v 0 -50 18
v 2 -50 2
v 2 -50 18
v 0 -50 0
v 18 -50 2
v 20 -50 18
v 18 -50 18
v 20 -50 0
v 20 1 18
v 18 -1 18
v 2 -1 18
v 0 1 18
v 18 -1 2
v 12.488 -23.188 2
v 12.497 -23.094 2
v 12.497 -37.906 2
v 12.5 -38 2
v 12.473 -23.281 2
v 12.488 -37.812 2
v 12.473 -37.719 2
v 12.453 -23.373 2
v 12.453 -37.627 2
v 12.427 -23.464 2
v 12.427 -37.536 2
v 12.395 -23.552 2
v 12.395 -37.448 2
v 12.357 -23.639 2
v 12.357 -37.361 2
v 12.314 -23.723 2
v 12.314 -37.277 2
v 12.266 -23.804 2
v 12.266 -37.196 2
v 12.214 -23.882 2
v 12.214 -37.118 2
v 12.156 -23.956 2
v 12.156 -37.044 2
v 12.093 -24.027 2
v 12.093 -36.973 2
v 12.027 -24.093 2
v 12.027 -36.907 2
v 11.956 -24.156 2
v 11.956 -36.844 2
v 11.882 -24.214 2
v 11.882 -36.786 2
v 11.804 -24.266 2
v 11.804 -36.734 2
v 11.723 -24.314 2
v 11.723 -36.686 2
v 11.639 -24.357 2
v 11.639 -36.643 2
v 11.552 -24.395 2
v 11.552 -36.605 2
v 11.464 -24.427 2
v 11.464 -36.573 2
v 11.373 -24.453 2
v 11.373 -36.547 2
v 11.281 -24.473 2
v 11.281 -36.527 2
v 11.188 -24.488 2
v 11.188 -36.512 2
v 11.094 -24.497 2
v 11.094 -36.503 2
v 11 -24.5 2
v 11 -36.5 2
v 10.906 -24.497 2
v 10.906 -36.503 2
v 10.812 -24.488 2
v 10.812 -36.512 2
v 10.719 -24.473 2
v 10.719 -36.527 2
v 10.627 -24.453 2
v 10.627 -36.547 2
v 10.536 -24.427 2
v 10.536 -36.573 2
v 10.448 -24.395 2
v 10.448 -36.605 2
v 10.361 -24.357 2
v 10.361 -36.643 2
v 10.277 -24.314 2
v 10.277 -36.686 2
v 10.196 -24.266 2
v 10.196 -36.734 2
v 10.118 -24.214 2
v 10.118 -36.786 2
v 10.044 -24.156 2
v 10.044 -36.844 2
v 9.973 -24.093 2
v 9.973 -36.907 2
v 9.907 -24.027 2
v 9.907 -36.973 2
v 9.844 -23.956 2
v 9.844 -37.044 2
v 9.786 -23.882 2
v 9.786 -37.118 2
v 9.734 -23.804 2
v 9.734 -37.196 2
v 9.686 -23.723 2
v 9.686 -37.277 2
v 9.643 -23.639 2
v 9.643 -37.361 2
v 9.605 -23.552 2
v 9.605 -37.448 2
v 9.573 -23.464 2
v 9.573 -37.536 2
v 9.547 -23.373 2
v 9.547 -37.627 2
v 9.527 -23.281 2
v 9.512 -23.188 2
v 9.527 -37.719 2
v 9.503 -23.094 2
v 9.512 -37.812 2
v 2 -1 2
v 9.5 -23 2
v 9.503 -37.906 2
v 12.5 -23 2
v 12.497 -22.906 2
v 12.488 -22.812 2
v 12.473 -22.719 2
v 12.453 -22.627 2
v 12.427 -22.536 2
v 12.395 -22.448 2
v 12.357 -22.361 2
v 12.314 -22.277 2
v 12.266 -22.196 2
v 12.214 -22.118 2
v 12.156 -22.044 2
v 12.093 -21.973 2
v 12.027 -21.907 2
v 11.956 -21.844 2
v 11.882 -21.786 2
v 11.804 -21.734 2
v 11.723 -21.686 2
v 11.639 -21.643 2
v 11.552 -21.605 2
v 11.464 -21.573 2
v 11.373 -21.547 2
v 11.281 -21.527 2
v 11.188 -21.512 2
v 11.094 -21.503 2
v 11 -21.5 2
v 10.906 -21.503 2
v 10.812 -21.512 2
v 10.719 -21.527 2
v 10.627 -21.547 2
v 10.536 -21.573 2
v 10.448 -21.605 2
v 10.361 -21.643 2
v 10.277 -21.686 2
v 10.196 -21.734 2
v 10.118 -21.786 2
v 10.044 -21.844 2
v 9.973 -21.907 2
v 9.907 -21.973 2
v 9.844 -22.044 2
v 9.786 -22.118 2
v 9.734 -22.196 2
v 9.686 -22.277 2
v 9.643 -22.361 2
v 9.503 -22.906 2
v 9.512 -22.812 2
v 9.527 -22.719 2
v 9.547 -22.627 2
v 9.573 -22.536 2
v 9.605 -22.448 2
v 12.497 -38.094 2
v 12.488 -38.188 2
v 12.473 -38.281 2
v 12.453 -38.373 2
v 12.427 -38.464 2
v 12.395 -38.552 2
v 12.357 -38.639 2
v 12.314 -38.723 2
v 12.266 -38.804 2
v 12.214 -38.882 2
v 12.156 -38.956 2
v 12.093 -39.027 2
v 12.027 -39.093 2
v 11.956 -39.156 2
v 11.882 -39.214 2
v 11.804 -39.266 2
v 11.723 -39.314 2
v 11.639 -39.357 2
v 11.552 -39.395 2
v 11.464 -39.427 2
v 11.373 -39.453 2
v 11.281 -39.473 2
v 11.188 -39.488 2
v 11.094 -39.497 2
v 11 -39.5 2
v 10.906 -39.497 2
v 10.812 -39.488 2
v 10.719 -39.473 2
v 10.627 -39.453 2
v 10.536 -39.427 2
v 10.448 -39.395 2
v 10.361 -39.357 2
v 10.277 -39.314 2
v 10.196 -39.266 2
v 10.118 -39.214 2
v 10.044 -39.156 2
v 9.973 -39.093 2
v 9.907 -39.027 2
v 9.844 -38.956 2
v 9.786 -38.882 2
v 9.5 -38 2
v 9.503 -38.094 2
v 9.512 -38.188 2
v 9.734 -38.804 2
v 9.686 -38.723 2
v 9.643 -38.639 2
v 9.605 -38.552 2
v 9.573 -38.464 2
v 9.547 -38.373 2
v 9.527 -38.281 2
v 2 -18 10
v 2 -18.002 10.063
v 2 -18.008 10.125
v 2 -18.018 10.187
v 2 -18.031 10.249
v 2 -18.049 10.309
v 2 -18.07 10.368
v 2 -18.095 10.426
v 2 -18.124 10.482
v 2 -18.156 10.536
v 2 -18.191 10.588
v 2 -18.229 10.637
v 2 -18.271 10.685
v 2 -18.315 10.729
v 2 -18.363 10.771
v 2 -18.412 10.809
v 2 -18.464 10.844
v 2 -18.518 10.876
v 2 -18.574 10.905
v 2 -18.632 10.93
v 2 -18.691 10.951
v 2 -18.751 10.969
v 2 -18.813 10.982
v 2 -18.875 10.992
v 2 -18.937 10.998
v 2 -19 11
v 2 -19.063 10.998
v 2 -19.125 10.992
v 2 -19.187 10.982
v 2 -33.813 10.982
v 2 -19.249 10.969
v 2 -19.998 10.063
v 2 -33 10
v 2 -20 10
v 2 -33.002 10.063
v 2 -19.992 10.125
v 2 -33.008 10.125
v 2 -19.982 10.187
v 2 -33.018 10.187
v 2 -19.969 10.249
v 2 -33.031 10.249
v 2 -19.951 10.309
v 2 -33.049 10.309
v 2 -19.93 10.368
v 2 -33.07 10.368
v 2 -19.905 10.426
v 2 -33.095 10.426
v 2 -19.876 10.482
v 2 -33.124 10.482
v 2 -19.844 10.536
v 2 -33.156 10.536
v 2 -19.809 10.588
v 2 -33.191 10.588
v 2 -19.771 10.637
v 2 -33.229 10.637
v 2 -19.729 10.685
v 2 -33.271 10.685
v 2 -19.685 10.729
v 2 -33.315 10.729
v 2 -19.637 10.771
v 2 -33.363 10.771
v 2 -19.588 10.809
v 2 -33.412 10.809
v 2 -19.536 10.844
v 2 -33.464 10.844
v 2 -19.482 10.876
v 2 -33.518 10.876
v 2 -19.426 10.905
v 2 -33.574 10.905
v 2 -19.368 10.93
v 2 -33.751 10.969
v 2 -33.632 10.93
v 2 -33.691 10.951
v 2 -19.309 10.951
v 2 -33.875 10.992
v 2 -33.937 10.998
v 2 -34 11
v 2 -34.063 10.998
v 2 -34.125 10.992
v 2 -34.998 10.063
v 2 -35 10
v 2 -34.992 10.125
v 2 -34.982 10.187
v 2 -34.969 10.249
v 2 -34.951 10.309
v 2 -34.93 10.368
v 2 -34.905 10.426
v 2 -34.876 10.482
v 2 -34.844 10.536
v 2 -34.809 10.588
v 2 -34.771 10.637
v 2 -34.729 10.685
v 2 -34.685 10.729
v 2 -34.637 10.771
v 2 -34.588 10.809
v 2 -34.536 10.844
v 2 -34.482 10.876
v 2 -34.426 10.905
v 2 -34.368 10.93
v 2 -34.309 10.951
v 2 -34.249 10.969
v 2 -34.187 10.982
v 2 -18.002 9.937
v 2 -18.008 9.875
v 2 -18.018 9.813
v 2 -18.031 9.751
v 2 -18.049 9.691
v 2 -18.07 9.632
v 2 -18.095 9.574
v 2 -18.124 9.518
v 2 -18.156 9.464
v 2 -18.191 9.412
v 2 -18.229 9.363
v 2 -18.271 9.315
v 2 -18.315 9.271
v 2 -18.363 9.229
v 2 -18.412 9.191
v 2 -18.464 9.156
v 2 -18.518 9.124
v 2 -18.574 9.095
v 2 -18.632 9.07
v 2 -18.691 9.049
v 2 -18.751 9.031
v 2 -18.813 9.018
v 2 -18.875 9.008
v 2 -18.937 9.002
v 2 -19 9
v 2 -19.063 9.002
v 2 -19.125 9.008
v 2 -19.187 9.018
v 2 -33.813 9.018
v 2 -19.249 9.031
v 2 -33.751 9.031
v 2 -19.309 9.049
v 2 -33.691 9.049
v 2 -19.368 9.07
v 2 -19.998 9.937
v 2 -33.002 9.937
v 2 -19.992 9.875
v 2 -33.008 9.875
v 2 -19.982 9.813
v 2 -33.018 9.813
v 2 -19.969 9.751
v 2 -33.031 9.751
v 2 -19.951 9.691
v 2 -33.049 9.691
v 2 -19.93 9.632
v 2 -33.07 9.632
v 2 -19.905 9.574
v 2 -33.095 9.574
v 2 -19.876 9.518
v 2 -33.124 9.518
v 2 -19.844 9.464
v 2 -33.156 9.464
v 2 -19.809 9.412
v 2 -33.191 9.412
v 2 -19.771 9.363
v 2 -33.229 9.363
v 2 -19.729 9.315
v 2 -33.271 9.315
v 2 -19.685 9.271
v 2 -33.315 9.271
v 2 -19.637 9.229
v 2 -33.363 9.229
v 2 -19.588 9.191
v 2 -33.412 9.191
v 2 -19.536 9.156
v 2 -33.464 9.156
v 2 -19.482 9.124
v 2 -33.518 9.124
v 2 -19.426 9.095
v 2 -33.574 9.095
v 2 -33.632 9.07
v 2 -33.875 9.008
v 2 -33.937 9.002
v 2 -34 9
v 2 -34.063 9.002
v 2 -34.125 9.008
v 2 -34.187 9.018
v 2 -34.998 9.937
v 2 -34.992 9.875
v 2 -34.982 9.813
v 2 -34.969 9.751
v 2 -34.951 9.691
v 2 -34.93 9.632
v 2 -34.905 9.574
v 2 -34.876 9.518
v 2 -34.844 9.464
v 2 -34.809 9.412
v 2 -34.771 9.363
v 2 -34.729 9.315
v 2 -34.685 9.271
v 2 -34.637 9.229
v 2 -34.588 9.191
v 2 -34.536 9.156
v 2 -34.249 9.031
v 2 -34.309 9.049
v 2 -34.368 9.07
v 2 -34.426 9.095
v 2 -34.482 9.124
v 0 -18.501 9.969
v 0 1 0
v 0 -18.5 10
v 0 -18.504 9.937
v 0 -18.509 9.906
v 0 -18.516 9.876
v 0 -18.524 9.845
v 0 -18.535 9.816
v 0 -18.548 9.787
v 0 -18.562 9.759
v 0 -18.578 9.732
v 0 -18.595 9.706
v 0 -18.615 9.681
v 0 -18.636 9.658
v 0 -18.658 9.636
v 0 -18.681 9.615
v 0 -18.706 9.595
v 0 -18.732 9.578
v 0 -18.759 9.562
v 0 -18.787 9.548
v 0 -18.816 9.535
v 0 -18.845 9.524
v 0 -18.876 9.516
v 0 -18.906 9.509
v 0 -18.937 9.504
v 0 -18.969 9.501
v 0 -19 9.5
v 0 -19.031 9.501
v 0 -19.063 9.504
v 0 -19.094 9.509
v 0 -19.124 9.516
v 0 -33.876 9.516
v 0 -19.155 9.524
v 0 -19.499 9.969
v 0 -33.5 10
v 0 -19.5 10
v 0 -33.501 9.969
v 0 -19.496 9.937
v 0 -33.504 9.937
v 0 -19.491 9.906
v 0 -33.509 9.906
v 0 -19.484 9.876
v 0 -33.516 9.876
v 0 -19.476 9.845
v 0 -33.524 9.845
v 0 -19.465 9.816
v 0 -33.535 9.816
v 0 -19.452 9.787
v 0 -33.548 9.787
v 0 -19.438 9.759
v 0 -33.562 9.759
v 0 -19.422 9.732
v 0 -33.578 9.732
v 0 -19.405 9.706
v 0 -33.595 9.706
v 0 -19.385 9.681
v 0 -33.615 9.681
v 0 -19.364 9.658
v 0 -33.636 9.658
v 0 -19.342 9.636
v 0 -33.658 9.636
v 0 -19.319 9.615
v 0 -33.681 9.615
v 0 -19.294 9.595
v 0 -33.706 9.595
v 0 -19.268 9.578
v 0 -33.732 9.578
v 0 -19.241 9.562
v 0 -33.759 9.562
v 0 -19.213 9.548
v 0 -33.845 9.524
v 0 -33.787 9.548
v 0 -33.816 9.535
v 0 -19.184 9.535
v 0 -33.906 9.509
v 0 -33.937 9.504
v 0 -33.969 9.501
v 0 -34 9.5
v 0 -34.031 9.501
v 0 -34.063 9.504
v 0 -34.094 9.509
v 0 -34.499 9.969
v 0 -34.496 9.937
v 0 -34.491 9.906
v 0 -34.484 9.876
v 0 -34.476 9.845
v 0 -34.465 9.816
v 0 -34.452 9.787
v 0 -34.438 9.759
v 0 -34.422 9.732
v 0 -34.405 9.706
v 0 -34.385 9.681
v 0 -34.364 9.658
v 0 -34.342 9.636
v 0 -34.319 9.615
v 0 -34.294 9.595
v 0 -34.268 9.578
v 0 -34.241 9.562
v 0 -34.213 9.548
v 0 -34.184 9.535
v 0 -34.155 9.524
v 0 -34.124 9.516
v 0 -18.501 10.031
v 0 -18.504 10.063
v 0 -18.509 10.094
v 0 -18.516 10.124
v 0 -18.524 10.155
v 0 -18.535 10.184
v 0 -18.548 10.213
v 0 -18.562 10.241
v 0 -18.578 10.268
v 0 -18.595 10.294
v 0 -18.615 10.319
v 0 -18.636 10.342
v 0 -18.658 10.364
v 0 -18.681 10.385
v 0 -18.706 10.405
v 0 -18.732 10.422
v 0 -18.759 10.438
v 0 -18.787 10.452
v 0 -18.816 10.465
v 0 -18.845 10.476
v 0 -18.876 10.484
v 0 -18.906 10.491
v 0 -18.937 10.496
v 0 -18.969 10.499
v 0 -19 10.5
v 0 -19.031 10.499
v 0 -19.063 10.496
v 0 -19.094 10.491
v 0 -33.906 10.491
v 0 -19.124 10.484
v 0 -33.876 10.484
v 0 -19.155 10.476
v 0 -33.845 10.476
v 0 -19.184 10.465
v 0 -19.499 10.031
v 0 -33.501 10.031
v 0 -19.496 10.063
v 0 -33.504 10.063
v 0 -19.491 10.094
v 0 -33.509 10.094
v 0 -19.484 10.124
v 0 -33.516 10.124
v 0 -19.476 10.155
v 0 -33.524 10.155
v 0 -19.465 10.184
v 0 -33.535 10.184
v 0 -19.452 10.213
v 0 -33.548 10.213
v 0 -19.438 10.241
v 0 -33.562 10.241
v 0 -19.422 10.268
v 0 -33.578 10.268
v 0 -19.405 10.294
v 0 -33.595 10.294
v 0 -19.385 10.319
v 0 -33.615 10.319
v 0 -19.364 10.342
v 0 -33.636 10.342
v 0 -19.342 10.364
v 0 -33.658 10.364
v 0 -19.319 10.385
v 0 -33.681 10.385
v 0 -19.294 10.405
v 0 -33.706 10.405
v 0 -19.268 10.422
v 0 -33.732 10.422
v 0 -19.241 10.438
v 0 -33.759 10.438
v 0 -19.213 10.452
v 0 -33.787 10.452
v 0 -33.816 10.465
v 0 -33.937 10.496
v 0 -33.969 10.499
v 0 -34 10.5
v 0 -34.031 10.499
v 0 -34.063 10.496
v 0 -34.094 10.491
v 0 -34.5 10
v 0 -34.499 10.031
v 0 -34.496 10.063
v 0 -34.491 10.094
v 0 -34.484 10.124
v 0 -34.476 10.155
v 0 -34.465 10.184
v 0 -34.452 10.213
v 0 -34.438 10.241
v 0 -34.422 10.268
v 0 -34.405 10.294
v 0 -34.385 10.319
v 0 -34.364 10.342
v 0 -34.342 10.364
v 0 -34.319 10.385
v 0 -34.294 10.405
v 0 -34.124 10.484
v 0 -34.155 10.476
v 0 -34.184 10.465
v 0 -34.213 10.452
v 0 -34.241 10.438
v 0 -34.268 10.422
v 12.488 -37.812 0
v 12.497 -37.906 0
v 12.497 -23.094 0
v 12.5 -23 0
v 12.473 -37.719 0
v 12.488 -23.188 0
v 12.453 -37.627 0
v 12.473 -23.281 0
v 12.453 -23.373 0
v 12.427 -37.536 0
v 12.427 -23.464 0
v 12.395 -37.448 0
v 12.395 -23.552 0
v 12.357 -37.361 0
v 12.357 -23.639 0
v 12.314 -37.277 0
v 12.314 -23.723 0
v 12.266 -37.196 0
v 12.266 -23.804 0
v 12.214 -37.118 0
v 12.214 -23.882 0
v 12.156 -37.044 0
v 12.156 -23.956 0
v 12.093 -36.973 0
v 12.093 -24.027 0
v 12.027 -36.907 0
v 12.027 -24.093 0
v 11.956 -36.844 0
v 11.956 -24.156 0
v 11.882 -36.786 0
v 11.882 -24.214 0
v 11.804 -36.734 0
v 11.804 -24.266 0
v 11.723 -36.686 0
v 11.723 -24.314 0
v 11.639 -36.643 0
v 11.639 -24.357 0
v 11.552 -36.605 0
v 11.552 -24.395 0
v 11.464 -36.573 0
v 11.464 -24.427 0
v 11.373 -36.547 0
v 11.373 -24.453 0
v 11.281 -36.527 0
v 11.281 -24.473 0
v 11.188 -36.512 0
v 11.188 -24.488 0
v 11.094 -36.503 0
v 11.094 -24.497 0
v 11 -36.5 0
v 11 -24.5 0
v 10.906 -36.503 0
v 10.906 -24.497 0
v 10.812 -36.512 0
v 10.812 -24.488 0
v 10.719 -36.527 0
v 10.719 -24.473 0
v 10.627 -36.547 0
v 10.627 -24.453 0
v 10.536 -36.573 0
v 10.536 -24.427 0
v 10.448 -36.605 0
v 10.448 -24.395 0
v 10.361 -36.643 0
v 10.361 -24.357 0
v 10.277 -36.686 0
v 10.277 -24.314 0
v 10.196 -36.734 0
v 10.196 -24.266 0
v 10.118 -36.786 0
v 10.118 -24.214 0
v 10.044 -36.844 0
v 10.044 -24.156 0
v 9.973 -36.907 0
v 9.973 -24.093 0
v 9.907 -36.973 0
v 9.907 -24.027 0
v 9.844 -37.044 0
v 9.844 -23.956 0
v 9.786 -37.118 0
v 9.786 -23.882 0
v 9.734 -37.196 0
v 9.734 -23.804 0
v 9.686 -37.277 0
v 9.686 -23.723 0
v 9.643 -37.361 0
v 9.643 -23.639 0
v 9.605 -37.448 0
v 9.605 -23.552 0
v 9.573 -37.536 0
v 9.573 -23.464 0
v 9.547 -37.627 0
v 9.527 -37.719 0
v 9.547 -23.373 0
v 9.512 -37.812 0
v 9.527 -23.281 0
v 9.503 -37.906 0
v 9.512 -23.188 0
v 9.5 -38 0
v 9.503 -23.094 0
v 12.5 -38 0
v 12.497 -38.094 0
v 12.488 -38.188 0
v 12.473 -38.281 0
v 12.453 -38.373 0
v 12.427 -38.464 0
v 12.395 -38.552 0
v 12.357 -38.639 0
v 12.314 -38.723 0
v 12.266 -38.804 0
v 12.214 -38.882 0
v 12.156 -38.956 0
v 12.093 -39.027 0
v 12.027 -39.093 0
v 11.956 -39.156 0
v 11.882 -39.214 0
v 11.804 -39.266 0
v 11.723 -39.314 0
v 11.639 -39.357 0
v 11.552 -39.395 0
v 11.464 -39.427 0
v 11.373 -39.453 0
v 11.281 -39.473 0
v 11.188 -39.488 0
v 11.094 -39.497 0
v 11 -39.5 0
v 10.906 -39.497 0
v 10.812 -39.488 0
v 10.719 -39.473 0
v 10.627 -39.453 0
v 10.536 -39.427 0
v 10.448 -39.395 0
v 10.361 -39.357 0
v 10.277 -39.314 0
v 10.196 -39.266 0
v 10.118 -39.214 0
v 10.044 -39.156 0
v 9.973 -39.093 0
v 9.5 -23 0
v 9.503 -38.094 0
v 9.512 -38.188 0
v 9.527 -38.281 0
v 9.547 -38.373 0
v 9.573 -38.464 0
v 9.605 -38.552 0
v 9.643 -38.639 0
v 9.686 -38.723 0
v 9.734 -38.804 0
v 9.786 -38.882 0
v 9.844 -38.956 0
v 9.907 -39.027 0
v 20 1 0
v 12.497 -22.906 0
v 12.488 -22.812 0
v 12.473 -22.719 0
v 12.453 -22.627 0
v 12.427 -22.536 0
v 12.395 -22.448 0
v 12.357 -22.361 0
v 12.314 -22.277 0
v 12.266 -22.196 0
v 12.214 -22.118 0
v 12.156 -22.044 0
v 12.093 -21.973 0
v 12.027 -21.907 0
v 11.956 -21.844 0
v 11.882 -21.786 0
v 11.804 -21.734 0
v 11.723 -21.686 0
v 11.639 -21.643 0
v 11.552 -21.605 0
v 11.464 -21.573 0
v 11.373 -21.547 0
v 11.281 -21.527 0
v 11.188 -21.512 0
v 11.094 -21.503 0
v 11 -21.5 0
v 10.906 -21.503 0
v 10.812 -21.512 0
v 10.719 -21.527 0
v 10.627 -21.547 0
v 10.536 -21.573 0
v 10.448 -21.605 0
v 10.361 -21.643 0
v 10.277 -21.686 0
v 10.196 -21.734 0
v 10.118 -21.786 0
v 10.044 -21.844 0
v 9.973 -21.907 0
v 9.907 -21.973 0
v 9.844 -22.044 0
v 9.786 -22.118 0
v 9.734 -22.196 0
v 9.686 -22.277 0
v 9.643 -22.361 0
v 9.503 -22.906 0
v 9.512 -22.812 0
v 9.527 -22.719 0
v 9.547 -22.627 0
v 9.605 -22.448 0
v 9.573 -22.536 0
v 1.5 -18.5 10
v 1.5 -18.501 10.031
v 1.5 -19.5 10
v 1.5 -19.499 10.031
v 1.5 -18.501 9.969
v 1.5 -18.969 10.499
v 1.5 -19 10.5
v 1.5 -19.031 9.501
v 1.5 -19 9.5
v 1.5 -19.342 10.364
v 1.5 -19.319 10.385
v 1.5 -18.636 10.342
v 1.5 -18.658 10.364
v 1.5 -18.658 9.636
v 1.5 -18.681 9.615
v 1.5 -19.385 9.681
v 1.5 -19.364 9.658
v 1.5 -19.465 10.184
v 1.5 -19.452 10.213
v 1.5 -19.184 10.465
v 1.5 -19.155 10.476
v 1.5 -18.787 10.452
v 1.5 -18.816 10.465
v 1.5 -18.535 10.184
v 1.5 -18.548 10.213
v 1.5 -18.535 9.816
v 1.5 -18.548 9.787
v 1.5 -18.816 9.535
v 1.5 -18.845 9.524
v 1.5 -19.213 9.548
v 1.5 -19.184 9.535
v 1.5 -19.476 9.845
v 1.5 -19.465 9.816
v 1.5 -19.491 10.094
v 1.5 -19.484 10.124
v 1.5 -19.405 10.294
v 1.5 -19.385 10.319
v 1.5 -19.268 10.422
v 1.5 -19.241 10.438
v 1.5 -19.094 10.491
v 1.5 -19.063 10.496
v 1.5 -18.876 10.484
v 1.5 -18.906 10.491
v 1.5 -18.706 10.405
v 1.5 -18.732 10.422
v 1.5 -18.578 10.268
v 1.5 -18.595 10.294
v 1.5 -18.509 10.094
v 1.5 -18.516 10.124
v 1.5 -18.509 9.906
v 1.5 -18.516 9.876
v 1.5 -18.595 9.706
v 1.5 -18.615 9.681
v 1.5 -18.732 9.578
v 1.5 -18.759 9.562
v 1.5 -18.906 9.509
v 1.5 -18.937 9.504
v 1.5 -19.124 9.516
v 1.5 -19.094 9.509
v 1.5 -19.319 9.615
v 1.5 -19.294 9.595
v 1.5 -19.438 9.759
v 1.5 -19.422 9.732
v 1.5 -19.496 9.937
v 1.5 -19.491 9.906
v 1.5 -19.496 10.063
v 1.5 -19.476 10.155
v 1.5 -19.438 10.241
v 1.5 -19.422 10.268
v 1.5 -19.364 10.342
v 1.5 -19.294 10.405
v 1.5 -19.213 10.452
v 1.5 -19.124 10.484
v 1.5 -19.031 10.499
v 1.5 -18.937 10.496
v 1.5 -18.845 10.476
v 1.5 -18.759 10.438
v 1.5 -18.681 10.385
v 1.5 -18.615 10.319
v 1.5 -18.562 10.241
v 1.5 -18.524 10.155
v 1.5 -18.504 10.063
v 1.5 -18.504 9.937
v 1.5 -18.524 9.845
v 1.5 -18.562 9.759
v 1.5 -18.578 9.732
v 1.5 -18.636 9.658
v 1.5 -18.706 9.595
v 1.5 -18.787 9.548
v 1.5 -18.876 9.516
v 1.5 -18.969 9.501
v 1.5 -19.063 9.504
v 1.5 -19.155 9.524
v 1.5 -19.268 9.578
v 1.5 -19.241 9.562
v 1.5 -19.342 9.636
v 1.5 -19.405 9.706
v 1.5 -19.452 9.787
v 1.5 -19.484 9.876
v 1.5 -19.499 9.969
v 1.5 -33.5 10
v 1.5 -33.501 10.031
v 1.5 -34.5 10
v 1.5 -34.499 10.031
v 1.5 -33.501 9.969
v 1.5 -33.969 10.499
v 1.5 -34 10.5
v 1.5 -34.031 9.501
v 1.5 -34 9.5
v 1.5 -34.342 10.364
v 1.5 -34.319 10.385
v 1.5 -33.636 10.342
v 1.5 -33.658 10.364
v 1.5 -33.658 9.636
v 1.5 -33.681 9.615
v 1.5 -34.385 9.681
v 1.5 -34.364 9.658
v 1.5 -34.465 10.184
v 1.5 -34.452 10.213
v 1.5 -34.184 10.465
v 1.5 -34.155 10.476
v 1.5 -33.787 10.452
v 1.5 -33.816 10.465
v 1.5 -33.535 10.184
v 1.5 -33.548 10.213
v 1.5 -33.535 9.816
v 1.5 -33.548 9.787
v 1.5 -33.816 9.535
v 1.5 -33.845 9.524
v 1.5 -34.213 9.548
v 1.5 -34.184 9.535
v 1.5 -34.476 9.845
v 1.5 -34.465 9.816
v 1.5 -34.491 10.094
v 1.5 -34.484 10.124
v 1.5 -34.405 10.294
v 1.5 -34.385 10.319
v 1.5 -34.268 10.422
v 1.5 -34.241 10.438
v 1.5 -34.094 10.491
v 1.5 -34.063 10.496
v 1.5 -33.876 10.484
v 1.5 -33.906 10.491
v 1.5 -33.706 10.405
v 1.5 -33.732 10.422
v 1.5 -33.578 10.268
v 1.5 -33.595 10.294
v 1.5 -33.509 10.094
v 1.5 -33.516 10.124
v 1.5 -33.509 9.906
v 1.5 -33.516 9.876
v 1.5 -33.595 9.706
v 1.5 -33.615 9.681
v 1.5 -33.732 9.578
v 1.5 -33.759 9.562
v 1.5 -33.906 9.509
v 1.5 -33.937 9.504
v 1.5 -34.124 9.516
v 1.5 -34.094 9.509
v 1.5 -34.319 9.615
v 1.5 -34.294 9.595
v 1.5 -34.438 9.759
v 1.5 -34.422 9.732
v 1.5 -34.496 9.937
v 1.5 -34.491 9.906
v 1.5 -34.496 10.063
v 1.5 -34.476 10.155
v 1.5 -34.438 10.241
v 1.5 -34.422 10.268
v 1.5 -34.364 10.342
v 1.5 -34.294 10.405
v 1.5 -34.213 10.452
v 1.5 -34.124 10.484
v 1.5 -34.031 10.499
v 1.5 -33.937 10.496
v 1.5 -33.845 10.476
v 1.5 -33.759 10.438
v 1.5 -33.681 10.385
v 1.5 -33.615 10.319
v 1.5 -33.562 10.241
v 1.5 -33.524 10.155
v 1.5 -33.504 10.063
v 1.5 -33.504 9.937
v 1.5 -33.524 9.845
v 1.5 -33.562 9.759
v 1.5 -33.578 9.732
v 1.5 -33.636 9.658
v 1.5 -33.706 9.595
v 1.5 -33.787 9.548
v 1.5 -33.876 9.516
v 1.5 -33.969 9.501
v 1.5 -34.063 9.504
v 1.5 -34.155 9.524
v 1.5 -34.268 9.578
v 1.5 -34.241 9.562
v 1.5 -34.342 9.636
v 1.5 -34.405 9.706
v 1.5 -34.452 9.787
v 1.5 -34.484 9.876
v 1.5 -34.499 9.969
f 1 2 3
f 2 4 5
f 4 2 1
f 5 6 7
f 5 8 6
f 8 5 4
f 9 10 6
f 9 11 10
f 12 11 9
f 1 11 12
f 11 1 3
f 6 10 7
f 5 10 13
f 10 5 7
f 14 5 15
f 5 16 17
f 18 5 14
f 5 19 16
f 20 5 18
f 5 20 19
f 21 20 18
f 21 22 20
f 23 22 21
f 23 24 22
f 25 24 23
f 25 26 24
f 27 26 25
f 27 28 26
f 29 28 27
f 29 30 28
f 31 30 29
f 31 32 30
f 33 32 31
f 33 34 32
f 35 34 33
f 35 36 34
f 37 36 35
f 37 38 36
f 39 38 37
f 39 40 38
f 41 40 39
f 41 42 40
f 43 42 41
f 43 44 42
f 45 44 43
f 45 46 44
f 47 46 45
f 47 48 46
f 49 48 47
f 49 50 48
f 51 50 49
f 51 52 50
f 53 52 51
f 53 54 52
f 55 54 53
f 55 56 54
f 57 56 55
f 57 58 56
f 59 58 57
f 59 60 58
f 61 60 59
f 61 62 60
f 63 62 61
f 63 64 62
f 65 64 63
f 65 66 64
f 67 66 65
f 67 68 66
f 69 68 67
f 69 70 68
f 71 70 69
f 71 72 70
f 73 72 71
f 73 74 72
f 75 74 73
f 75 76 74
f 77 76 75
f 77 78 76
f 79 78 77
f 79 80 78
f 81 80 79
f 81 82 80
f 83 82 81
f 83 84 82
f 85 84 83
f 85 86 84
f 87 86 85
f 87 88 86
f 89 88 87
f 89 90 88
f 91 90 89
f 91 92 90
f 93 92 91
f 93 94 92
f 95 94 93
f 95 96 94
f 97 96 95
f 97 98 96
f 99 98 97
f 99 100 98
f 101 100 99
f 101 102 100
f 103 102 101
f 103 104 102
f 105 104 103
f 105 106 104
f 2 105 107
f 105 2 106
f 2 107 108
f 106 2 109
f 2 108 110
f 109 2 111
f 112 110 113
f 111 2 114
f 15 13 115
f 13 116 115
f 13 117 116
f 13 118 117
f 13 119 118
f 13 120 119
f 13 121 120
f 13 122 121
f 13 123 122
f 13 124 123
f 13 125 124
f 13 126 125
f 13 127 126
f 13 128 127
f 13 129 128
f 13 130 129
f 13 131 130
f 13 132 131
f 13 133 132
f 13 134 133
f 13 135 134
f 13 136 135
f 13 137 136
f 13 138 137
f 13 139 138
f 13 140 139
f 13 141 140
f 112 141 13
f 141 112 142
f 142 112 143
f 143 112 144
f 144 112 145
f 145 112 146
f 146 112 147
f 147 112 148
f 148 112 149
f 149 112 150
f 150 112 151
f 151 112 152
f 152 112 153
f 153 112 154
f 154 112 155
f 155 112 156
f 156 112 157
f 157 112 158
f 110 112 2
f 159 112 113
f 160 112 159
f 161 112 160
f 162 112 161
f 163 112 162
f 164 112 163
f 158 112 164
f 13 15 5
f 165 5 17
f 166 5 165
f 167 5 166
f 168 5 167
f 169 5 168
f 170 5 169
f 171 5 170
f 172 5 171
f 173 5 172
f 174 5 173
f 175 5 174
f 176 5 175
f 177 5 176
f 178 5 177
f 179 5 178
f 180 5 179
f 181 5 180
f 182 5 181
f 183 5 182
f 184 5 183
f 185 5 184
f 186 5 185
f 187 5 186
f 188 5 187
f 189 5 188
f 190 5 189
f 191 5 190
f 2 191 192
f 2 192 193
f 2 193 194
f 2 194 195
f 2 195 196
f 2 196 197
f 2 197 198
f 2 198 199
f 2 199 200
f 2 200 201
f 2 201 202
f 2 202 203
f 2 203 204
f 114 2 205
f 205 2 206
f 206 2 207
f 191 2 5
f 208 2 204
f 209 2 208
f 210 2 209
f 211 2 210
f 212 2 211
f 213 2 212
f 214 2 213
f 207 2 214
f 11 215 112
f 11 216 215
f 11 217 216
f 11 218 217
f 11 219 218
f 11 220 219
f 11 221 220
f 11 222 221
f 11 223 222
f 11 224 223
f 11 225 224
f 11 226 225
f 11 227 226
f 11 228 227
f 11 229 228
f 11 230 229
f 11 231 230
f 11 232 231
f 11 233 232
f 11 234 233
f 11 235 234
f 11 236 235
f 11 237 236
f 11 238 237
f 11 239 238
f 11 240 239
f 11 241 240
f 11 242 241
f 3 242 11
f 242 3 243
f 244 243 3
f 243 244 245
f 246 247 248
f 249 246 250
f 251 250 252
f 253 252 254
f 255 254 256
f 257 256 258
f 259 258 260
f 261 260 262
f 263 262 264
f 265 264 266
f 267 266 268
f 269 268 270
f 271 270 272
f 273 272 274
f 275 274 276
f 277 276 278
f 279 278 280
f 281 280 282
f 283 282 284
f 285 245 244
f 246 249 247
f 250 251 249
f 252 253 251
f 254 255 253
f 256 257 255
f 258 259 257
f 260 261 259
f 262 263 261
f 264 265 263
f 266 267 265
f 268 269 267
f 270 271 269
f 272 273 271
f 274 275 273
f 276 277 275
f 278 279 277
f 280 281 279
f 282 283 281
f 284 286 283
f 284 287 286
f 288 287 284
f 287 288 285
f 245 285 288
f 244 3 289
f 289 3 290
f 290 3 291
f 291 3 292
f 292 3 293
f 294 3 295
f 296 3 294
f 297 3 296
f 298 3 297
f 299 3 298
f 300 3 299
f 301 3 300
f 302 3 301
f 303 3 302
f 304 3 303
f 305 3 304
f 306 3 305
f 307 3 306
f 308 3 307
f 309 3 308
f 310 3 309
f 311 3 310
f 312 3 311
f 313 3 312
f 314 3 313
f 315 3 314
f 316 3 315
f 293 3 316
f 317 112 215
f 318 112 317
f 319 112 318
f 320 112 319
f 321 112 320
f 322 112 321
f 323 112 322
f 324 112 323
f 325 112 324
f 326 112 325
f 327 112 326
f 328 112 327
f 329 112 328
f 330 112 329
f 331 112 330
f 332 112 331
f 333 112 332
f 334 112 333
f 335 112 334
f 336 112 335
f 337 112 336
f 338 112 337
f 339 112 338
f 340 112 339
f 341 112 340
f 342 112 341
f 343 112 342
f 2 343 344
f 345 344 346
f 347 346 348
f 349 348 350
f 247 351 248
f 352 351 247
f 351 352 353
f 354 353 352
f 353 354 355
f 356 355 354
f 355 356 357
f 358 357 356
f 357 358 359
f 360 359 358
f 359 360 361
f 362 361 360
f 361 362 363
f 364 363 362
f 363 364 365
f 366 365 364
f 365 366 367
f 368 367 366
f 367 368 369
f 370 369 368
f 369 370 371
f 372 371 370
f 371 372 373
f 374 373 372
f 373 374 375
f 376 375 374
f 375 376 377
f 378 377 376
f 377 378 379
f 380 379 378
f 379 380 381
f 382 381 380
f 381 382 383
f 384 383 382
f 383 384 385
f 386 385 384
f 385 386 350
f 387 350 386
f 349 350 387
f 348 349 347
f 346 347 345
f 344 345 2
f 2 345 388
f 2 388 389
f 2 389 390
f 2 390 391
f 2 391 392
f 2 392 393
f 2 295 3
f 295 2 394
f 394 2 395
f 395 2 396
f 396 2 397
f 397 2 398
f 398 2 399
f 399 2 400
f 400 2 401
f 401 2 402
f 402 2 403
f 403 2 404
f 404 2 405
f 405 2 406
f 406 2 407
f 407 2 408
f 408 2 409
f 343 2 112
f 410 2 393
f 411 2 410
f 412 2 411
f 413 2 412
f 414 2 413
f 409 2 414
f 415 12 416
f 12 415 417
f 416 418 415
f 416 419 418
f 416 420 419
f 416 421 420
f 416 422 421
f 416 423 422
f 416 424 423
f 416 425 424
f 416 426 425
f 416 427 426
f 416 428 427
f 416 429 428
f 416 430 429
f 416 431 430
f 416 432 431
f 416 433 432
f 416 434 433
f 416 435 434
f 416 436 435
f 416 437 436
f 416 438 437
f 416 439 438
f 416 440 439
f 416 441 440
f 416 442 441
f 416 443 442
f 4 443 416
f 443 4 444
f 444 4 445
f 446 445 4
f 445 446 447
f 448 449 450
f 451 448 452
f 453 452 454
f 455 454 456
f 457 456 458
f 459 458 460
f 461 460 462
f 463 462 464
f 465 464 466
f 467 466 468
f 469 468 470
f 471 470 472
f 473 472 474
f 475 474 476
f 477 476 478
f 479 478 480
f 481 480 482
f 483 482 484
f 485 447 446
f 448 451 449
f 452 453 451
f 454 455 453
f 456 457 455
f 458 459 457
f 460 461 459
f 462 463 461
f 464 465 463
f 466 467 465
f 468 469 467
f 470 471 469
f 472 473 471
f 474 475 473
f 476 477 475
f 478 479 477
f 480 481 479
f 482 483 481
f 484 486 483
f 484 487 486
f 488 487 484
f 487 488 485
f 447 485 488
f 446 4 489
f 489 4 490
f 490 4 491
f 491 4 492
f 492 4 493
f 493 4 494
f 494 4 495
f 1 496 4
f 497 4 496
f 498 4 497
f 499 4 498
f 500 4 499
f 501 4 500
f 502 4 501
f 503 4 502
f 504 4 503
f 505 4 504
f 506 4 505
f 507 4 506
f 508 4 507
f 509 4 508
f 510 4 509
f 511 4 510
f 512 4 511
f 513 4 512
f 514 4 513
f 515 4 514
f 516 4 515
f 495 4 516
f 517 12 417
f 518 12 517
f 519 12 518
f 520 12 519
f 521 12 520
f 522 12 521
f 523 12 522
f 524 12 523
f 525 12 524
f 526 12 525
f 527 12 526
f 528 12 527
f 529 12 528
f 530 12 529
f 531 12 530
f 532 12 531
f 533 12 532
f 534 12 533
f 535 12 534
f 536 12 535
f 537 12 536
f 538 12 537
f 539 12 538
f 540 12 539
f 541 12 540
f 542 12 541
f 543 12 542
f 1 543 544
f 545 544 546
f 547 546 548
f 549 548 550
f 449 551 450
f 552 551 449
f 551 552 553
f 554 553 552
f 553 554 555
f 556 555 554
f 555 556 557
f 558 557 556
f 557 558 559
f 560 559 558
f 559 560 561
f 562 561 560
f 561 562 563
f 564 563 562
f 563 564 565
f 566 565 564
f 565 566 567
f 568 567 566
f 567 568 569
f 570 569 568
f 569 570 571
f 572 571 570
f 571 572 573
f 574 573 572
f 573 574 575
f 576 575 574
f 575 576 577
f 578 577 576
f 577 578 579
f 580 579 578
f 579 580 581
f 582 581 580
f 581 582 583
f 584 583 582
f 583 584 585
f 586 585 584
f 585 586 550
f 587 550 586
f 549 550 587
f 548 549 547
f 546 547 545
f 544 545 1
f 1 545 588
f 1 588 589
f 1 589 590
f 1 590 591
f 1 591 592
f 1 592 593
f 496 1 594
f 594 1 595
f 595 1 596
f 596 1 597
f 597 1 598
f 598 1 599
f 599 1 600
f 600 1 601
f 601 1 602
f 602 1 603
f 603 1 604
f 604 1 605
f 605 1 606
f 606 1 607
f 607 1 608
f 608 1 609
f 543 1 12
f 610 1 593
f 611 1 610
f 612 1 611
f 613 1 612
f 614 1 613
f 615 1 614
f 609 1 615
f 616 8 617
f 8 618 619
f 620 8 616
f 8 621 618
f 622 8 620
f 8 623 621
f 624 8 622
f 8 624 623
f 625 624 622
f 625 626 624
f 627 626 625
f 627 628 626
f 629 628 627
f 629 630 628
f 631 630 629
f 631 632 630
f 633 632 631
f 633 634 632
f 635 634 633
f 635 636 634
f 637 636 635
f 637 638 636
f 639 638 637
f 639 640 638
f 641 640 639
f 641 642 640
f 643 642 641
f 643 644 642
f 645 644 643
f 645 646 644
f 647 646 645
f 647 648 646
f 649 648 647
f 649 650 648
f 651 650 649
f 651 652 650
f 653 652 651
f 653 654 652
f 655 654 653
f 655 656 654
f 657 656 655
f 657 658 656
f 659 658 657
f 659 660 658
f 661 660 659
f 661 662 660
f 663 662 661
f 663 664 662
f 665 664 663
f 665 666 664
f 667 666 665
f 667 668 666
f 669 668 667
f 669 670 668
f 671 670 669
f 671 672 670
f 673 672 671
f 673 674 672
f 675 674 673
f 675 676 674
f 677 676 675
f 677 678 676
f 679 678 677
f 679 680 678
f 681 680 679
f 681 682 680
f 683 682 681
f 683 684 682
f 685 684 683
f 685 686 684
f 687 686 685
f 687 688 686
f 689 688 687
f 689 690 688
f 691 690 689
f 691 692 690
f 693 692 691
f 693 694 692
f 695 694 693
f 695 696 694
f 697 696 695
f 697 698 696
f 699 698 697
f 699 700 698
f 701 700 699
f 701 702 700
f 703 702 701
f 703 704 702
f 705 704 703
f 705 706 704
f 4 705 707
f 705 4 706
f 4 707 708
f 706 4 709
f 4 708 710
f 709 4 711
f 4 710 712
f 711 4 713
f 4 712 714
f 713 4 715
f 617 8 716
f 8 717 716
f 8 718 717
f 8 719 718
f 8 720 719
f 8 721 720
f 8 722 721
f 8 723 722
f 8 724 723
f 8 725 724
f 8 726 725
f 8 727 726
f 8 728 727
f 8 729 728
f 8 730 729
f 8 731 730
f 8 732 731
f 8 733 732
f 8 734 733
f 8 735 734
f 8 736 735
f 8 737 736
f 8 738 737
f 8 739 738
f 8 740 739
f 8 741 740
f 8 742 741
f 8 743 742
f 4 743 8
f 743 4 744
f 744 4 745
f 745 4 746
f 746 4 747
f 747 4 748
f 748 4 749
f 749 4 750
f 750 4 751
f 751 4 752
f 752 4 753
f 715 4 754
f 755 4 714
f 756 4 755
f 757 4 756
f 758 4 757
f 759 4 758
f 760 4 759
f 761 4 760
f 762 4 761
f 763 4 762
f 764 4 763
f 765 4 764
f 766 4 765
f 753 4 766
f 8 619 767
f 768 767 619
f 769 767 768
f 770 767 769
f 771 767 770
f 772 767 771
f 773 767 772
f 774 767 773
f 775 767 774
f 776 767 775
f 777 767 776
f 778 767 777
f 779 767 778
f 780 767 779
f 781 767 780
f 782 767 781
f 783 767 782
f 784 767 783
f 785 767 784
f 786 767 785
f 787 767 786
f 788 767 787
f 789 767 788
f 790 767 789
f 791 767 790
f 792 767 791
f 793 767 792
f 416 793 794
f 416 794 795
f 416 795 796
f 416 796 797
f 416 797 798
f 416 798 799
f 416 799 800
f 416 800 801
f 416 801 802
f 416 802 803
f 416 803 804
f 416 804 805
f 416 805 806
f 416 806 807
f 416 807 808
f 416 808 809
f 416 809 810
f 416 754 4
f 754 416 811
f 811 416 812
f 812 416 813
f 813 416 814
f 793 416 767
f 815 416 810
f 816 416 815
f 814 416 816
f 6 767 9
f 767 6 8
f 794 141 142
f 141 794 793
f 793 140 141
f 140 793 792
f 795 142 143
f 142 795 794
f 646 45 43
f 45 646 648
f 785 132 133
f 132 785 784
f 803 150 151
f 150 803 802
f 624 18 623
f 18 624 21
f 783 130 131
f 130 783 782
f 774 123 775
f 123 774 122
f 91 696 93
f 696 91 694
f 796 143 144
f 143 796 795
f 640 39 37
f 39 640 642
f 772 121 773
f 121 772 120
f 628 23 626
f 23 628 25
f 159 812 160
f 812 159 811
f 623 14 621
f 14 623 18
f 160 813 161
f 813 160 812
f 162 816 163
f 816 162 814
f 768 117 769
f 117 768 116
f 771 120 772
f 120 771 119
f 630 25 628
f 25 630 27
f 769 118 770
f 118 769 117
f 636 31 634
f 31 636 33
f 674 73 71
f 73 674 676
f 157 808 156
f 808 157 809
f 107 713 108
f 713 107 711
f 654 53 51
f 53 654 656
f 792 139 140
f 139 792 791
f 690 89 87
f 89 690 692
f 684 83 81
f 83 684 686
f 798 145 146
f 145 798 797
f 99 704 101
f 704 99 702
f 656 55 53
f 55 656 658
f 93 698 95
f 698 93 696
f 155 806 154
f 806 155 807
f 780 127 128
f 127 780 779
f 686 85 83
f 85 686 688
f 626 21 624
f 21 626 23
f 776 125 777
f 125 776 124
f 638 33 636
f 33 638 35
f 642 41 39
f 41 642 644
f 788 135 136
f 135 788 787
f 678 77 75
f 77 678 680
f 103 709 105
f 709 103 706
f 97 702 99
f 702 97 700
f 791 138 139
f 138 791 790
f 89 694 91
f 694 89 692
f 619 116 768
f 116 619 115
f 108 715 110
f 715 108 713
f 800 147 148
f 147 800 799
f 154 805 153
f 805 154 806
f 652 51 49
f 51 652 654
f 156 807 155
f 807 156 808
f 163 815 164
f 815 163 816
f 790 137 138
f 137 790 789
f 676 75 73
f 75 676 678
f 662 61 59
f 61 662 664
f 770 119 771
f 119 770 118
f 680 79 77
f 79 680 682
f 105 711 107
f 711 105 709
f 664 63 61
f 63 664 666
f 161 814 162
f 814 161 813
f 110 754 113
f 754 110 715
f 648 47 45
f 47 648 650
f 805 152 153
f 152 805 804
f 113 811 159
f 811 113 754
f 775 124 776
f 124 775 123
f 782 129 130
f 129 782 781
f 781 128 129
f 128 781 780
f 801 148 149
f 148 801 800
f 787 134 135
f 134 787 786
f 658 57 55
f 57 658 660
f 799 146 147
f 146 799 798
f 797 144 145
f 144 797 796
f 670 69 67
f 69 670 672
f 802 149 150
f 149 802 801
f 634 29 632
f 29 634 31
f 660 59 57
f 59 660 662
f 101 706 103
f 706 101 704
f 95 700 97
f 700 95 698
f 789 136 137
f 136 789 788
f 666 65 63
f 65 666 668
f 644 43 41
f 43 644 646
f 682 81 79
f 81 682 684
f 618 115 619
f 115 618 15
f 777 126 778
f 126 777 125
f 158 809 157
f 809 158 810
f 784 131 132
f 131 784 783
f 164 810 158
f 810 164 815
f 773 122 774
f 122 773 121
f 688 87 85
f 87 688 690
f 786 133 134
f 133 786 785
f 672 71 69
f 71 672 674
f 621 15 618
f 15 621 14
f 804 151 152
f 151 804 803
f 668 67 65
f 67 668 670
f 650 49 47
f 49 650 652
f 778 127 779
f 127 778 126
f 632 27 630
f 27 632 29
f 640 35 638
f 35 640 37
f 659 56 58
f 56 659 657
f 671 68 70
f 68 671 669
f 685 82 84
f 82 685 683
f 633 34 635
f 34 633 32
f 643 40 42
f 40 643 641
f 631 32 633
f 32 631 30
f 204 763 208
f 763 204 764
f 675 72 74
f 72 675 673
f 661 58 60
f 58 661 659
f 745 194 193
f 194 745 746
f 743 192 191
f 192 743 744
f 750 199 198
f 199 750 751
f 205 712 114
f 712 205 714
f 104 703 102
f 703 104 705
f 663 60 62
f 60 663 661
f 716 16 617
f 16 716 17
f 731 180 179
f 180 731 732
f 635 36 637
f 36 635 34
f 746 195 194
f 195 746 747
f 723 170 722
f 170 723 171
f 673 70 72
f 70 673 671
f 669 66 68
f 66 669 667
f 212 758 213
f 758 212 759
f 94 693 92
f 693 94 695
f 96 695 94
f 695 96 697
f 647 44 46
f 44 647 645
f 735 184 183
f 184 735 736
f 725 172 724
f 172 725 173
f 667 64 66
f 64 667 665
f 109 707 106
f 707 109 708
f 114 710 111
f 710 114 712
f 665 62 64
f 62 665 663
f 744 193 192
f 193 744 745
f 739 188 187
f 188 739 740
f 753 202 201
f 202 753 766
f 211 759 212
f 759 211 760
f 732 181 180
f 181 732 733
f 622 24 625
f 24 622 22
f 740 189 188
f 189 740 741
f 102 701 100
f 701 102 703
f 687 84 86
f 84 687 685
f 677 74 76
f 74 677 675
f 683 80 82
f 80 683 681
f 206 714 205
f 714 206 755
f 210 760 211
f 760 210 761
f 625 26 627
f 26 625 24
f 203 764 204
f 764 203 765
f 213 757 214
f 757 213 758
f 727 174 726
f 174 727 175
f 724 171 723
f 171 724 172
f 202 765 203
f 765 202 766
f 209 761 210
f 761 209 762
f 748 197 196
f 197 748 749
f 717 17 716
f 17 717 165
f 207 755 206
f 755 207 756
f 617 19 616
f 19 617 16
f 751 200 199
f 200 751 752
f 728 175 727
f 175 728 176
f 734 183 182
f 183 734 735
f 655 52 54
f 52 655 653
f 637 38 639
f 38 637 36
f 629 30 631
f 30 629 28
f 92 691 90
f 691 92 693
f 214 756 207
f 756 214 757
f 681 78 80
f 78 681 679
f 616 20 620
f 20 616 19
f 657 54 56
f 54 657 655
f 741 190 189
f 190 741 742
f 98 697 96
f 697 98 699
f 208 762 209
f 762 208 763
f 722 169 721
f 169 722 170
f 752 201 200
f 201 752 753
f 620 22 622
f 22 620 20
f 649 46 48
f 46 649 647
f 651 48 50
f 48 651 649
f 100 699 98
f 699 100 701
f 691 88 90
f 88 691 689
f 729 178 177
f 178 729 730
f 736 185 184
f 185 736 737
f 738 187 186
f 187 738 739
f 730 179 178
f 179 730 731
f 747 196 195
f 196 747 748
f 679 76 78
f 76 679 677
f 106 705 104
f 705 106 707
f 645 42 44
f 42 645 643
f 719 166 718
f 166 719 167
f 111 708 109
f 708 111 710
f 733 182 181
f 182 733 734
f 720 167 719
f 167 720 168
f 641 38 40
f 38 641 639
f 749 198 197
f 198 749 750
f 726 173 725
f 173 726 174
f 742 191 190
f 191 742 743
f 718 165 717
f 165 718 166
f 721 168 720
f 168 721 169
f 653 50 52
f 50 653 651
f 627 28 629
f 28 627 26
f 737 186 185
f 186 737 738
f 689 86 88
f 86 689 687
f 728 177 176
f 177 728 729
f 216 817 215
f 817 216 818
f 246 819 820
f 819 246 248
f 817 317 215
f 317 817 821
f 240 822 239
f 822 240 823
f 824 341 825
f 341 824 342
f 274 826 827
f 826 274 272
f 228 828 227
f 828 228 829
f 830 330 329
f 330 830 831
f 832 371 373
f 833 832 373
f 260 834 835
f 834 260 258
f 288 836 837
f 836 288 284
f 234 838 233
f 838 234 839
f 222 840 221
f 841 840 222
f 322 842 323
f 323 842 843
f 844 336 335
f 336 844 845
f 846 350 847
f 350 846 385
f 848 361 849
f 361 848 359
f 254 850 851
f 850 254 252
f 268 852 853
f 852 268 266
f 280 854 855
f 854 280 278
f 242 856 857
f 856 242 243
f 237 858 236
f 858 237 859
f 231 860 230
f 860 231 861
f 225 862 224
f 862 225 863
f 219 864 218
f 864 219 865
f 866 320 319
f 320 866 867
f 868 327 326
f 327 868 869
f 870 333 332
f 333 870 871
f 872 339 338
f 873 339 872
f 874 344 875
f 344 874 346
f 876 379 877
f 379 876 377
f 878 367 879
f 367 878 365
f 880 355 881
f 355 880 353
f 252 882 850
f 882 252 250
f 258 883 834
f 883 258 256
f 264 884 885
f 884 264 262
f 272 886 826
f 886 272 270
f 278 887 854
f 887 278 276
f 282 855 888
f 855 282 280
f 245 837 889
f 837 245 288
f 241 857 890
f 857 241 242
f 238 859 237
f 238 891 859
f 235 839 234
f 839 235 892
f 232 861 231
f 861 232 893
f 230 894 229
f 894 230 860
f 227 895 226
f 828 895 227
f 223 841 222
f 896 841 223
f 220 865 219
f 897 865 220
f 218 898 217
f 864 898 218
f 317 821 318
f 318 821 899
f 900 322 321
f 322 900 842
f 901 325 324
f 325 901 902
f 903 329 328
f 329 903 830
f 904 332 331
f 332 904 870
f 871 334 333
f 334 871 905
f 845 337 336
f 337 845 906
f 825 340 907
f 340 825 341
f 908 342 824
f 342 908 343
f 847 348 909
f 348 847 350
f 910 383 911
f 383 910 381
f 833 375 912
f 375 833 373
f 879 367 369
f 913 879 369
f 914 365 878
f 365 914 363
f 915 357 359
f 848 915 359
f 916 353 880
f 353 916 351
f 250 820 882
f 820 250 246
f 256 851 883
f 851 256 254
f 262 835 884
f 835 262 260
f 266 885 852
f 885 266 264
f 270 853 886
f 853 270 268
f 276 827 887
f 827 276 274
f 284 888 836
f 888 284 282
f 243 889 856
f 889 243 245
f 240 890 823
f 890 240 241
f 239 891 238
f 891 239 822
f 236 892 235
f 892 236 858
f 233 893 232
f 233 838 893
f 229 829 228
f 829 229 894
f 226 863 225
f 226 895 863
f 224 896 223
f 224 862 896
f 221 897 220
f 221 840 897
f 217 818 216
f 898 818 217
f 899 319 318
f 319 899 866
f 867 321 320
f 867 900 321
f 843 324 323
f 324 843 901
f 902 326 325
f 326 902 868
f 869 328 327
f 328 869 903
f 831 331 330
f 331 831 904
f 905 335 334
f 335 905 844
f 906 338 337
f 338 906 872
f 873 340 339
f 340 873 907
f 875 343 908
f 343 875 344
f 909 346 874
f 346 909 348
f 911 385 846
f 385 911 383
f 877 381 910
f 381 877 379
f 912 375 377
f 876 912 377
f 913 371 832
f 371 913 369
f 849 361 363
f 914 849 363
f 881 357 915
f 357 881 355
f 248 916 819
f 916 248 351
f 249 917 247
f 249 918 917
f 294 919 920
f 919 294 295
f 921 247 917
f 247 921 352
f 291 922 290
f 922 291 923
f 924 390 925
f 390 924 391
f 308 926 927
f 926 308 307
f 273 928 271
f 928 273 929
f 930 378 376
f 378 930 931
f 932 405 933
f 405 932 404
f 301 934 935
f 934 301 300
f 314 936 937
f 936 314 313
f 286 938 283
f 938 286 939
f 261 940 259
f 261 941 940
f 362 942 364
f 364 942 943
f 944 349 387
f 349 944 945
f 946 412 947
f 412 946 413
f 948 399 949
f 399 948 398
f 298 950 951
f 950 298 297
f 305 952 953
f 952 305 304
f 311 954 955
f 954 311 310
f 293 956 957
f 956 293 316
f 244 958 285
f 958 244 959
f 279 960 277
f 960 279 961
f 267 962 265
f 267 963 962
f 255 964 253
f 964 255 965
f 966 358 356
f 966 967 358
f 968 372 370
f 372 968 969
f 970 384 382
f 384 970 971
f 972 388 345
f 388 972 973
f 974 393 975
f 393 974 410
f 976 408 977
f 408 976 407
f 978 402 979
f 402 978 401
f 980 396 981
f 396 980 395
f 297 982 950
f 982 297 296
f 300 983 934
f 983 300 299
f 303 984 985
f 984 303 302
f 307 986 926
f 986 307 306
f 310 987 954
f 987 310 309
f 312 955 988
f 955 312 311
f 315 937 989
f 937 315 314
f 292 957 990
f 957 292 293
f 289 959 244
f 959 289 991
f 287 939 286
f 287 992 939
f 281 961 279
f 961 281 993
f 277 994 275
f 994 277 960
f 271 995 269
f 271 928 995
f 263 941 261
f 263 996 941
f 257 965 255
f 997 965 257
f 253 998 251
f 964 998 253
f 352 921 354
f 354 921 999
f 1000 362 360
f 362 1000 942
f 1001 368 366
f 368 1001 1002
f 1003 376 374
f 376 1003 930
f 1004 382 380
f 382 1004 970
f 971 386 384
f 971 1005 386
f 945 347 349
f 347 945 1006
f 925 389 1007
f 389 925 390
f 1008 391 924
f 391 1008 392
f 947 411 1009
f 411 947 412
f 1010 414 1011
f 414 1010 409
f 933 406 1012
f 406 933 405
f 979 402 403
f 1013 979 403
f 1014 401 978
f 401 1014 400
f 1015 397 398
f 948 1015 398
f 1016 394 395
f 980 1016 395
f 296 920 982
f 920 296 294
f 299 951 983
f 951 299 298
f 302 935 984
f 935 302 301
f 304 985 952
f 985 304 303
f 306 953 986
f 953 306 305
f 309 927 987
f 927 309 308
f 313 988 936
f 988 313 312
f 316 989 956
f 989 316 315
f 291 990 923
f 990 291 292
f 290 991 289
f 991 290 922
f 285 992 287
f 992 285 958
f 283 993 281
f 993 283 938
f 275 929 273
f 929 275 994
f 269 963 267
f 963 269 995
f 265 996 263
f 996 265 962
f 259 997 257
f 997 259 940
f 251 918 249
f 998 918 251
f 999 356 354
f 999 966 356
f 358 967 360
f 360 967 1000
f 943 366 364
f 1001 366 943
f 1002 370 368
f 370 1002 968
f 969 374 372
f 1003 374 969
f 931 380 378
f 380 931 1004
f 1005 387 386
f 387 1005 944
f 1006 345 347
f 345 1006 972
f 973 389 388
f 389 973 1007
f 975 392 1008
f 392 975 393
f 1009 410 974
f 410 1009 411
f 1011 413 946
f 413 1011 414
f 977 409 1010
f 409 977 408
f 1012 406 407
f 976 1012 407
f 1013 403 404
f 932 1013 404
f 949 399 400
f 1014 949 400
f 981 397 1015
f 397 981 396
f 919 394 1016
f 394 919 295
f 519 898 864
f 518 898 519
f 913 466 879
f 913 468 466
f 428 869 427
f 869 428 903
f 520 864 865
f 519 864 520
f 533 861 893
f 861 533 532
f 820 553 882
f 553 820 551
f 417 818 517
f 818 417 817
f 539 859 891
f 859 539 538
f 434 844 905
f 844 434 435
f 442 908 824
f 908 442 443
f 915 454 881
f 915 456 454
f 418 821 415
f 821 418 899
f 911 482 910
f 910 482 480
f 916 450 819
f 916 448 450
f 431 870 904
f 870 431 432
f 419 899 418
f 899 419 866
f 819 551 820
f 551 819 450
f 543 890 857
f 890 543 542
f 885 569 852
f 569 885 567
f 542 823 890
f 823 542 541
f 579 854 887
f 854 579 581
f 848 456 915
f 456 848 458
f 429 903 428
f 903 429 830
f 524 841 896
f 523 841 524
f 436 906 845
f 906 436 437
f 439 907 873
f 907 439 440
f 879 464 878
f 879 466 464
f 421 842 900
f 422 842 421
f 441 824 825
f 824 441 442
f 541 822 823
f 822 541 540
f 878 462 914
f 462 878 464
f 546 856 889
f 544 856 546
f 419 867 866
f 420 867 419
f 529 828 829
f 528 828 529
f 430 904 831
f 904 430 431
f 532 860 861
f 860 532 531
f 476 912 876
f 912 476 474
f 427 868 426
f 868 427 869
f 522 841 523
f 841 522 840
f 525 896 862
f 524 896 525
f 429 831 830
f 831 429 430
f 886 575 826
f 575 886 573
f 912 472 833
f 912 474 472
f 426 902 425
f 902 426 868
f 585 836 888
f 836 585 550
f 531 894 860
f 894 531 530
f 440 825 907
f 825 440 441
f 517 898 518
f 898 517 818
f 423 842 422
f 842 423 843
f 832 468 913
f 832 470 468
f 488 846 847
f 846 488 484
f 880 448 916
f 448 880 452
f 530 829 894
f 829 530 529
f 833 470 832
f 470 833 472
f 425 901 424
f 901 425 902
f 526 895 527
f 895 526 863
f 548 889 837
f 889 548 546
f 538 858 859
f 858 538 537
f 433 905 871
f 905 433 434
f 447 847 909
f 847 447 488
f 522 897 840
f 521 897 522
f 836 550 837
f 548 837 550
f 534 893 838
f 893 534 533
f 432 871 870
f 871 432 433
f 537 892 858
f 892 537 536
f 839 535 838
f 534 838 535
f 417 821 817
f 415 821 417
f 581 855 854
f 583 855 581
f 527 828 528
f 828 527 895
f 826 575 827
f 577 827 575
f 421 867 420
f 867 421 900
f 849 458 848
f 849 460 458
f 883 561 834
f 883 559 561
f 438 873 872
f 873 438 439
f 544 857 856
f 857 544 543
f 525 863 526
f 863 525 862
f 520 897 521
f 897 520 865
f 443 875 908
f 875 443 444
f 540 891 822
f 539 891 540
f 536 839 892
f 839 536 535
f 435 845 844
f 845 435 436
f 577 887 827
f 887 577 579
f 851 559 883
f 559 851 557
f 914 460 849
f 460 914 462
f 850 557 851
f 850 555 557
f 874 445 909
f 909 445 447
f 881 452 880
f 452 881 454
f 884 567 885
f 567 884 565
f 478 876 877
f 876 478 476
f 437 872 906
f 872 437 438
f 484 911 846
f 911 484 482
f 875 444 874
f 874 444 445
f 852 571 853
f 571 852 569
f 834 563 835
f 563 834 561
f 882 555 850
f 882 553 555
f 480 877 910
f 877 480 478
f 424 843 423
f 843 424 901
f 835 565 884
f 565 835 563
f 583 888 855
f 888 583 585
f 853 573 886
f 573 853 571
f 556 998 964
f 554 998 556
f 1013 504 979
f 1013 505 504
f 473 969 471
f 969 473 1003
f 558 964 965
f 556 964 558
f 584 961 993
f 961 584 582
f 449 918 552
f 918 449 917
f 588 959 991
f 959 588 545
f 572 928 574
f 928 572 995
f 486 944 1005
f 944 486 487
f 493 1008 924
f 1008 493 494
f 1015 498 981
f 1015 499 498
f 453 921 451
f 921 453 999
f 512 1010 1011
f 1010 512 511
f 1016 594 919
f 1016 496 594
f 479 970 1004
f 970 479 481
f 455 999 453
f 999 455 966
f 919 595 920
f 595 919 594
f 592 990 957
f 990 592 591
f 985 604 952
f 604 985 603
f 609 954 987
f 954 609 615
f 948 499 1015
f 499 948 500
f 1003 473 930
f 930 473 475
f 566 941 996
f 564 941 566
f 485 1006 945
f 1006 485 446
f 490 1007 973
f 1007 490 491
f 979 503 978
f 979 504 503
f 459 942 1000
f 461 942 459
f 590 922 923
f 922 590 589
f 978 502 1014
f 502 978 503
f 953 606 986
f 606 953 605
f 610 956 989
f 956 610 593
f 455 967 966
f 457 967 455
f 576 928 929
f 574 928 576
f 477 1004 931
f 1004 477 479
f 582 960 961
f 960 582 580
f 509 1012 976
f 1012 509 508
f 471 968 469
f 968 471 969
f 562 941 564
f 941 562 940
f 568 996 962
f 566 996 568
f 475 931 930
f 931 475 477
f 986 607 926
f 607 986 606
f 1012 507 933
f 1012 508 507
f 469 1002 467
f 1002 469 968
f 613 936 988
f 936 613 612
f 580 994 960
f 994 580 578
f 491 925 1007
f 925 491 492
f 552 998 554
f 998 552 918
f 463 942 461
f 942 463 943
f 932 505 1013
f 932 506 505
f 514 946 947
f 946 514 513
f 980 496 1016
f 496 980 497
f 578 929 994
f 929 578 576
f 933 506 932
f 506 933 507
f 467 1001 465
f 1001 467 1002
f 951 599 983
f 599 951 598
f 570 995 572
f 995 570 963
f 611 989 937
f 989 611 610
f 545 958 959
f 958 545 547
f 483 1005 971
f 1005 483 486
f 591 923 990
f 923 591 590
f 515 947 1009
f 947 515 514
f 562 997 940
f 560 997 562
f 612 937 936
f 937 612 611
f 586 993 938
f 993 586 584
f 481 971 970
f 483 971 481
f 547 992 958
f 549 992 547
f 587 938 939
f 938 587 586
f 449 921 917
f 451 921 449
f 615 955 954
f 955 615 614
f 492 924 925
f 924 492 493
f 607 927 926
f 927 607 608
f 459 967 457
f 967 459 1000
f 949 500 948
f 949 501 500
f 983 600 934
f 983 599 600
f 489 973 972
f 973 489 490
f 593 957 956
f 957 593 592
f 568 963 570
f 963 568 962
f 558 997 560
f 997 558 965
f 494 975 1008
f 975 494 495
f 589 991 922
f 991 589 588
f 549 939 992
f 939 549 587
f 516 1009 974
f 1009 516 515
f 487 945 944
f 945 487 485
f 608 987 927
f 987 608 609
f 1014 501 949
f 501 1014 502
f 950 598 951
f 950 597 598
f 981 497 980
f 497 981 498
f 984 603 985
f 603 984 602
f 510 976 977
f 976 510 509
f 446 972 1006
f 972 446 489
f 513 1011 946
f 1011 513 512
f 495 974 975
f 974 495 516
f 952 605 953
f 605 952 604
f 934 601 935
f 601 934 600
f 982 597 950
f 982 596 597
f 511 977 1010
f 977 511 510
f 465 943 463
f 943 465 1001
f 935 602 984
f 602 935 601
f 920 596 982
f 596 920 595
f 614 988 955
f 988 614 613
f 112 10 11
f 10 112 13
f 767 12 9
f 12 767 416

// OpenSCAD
w = 16;
h = 16;
wall = 2;
strike = 14;

rotate([90,0,0]) {
union() {
    difference() {
        linear_extrude(50) {
            polygon(points=[[0,0],[0,wall+h],[wall,wall+h],[wall,wall],[wall+w,wall],[wall+w,wall+h],[wall*2+w,wall+h], [wall*2+w,0]]);
        };
        translate([11,-1,2+7+strike]) {
            rotate([0,90,90]) {
                cylinder(5,1.5,1.5, $fn=100);
            }
        }
        translate([11,-1,2+7+15+strike]) {
            rotate([0,90,90]) {
                cylinder(5,1.5,1.5, $fn=100);
            }
        }
           translate([1,10,2+7+10]) {
            rotate([0,90,0]) {
                cylinder(5,0,5, $fn=100);
            }
        }
        translate([1,10,2+7+15+10]) {
            rotate([0,90,0]) {
                cylinder(5,0,5, $fn=100);
            }
        }
        
        translate([-1,10,2+7+10]) {
            rotate([0,90,0]) {
                cylinder(5,0.5,0.5, $fn=100);
            }
        }
        translate([-1,10,2+7+15+10]) {
            rotate([0,90,0]) {
                cylinder(5,0.5,0.5, $fn=100);
            }
        }
    }

    

    //polygon(points=[[0,0],[0,wall+h],[wall,wall+h],[wall,wall],[wall+w,wall],[wall+w,0]]);
    
    translate([0,0,-1]) {
    cube([wall*2+w,wall+h,wall]);
    }
/*
    translate([wall*2+w,wall,wall-1]) {
        rotate([0,270,0]) {
            linear_extrude(wall) {
                polygon(points=[
                    [0,0],
                    [wall+h,0],
                    [0,w]
                    ]);
            }
        }
    }
  */  
}
}
